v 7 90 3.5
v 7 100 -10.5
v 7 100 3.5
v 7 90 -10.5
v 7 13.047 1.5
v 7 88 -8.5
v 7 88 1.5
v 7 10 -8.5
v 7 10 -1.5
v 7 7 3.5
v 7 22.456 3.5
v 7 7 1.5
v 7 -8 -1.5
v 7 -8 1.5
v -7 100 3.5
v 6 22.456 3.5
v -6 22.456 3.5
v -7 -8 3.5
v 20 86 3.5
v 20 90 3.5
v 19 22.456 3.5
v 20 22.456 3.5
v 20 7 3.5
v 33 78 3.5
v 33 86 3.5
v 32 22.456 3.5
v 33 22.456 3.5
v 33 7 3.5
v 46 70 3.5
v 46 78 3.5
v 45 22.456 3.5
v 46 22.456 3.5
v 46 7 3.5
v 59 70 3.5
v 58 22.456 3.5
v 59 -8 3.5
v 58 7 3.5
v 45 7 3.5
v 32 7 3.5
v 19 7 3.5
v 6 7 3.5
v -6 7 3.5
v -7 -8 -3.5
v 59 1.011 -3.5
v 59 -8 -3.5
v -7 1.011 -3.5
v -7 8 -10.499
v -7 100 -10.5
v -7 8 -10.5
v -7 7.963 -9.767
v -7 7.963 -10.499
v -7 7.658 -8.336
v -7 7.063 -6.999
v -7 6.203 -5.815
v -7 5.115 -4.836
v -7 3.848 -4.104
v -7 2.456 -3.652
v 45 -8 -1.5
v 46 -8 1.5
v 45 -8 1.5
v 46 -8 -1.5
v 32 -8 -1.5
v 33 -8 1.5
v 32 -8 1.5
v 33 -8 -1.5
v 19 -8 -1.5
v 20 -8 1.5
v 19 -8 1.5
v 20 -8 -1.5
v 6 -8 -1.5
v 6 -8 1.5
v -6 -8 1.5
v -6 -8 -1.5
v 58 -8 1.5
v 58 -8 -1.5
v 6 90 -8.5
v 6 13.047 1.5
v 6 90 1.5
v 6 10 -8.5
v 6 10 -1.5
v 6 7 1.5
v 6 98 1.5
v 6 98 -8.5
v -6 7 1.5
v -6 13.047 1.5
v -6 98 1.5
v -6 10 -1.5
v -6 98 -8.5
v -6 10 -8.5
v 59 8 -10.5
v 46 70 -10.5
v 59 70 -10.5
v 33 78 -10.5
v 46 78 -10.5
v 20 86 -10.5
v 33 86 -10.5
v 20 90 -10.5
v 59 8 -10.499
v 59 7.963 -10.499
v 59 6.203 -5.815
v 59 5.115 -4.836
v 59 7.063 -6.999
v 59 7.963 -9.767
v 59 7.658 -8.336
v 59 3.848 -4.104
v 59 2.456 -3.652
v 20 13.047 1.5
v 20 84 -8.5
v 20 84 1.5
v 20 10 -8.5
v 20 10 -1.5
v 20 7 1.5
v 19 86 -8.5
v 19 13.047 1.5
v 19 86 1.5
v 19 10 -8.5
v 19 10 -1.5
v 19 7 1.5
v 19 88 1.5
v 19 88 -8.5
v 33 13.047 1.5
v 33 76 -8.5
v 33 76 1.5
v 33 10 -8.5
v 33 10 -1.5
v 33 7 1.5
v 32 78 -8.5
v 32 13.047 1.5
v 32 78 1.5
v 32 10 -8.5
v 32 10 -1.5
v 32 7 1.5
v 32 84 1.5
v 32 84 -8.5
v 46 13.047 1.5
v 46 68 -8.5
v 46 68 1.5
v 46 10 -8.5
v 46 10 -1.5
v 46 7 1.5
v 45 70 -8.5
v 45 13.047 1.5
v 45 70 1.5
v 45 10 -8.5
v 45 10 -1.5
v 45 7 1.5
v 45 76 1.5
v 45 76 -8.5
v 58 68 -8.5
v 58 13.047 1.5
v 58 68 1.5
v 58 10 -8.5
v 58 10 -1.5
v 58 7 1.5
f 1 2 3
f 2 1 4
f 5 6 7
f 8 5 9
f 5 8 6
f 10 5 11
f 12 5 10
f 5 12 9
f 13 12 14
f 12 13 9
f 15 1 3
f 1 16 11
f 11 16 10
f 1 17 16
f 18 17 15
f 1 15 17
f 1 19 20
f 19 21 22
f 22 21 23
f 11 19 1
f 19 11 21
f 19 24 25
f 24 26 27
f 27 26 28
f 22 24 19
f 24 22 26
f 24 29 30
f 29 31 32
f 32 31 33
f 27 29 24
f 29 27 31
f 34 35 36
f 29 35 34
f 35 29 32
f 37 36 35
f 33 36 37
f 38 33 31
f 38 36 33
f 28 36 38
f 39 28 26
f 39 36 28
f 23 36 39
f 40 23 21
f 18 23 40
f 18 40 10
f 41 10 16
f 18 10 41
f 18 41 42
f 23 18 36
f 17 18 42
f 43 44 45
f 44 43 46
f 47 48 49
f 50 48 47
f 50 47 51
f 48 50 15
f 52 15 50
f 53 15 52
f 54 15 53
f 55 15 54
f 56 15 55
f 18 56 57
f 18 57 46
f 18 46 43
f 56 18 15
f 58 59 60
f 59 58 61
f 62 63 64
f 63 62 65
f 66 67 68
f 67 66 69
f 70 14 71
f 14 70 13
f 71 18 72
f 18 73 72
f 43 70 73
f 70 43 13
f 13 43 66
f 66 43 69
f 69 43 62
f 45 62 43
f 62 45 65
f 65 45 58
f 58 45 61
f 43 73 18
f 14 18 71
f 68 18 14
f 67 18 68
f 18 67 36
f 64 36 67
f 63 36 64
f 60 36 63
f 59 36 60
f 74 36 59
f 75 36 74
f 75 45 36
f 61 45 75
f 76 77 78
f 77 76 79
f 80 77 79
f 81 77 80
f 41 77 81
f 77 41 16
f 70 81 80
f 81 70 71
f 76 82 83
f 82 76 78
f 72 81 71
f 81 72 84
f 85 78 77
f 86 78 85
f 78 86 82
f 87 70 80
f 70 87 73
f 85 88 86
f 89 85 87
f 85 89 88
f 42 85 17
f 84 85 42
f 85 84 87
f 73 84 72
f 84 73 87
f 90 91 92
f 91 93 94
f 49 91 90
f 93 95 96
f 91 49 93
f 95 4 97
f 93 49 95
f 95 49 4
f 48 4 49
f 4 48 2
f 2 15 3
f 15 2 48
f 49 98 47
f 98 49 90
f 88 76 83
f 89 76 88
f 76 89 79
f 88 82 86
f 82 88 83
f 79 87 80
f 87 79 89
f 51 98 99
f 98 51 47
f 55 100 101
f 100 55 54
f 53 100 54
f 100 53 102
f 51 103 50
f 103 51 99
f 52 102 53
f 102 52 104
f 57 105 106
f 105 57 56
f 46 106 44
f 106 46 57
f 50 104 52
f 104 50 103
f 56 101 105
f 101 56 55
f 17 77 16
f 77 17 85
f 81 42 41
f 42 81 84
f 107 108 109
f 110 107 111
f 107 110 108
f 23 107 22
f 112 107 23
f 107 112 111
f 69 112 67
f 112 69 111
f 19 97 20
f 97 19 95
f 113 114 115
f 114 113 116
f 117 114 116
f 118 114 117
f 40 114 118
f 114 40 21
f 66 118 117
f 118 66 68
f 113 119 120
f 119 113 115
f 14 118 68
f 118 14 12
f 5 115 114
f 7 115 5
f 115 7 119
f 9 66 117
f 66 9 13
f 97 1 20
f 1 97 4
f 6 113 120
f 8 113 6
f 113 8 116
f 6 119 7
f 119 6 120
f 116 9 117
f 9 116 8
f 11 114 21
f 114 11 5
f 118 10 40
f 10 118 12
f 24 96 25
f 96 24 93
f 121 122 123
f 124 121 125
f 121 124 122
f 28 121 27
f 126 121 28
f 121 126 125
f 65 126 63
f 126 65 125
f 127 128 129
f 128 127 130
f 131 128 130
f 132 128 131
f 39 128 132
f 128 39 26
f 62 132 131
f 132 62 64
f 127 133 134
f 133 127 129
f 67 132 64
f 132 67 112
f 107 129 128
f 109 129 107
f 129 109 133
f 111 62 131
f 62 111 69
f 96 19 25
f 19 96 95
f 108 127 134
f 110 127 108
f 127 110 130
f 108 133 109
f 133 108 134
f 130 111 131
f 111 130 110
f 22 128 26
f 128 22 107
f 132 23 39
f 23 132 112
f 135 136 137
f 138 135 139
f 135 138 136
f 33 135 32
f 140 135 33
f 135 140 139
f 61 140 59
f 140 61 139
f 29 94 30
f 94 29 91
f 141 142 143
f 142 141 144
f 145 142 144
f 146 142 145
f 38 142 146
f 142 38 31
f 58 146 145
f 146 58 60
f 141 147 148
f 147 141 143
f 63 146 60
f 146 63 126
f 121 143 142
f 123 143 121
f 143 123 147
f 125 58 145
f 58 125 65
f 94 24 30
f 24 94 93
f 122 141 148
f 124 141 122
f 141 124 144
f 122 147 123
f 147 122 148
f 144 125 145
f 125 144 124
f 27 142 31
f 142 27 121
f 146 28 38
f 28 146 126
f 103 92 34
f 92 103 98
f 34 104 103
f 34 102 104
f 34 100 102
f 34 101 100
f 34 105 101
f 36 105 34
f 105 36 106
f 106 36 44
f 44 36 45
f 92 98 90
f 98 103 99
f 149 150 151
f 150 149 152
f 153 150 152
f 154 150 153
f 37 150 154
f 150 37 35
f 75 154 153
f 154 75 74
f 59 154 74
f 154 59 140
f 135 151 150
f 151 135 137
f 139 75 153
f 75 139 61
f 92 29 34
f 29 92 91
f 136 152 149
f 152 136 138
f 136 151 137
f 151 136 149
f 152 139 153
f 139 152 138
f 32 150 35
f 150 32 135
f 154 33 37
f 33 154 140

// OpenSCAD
windway_width=12/1;
windway_height=3/1;
windway_length=16/1;
sidewall=1/1;
wall=2/1;
extra=1/1;
chamber_height=10/1;
chamber_width=windway_width;

ramp_angle=12/1;
opening_width=6/1;
ramp_length=(wall+extra)/tan(ramp_angle);

length_for_a4=176.4/1;


num_whistles=5; //[1:5]
length1=88;	//[30:150]
length2=78;	//[30:150]
length3=74;	//[30:150]
length4=66;	//[30:150]
length5=58;	//[30:150]


// notes=[12,14,15,17,19,20,22]; /* A5 B5 C6 D6 E6 F6 G6 */
//notes=[18,22];
//num_notes=2;


function note_to_freq(halfstep_from_a4) = 440 * pow(1.059463094359, halfstep_from_a4);

function note_to_length(halfstep_from_a4) = 440/note_to_freq(halfstep_from_a4) * length_for_a4;


whistle(length1);
if (num_whistles>1)
	translate([1*(windway_width+sidewall),0,0])
			whistle(length2);
if (num_whistles>2)
	translate([2*(windway_width+sidewall),0,0])
			whistle(length3);
if (num_whistles>3)
	translate([3*(windway_width+sidewall),0,0])
			whistle(length4);
if (num_whistles>4)
	translate([4*(windway_width+sidewall),0,0])
			whistle(length5);

module whistle(chamber_length=86) {
	difference() {
		union() {
			translate([0,wall/4,0]) difference() {
				cube([windway_width+sidewall*2,windway_length+wall/2,windway_height+wall*2], center=true);
				cube([windway_width,windway_length+wall/2+extra,windway_height], center=true);
			}
			
			translate([0,chamber_length/2+windway_length/2+wall,-chamber_height/2+windway_height/2]) { 
				difference() {
					cube([chamber_width+sidewall*2, chamber_length+wall*2, chamber_height+wall*2], center=true);
					cube([chamber_width,chamber_length,chamber_height], center=true);
					translate([0,-chamber_length/2-wall/2,chamber_height/2+wall-windway_height/2-wall])
					cube([windway_width, wall*2, windway_height], center=true);
				}
			}

			translate([0,windway_length/2-(chamber_height-windway_height)/2+0.001,-chamber_height/2-wall+0.001]) {
				difference() {
					cube([chamber_width+sidewall*2,chamber_height-windway_height,chamber_height-windway_height], center=true);
					translate([0,-(chamber_height-windway_height)/2,-(chamber_height-windway_height)/2])
						rotate([0,90,0]) 
							cylinder(r=chamber_height-windway_height, h=chamber_width+sidewall*2+1, center=true, $fn=30);
				}
			}

		}
		
		translate([-windway_width/2,windway_length/2+opening_width+wall-opening_width/2,windway_height/2-0.01])
			ramp_cutout();
	}
}

module ramp_cutout() {
		 translate([0,-opening_width,0]) rotate([0,0,90]) rotate([90,0,0]) linear_extrude(height=windway_width)
	 		polygon(points=[[0,0],[opening_width,0],[opening_width+ramp_length,wall+extra],[0,wall+extra]], paths=[[0,1,2,3,0]]);
}
